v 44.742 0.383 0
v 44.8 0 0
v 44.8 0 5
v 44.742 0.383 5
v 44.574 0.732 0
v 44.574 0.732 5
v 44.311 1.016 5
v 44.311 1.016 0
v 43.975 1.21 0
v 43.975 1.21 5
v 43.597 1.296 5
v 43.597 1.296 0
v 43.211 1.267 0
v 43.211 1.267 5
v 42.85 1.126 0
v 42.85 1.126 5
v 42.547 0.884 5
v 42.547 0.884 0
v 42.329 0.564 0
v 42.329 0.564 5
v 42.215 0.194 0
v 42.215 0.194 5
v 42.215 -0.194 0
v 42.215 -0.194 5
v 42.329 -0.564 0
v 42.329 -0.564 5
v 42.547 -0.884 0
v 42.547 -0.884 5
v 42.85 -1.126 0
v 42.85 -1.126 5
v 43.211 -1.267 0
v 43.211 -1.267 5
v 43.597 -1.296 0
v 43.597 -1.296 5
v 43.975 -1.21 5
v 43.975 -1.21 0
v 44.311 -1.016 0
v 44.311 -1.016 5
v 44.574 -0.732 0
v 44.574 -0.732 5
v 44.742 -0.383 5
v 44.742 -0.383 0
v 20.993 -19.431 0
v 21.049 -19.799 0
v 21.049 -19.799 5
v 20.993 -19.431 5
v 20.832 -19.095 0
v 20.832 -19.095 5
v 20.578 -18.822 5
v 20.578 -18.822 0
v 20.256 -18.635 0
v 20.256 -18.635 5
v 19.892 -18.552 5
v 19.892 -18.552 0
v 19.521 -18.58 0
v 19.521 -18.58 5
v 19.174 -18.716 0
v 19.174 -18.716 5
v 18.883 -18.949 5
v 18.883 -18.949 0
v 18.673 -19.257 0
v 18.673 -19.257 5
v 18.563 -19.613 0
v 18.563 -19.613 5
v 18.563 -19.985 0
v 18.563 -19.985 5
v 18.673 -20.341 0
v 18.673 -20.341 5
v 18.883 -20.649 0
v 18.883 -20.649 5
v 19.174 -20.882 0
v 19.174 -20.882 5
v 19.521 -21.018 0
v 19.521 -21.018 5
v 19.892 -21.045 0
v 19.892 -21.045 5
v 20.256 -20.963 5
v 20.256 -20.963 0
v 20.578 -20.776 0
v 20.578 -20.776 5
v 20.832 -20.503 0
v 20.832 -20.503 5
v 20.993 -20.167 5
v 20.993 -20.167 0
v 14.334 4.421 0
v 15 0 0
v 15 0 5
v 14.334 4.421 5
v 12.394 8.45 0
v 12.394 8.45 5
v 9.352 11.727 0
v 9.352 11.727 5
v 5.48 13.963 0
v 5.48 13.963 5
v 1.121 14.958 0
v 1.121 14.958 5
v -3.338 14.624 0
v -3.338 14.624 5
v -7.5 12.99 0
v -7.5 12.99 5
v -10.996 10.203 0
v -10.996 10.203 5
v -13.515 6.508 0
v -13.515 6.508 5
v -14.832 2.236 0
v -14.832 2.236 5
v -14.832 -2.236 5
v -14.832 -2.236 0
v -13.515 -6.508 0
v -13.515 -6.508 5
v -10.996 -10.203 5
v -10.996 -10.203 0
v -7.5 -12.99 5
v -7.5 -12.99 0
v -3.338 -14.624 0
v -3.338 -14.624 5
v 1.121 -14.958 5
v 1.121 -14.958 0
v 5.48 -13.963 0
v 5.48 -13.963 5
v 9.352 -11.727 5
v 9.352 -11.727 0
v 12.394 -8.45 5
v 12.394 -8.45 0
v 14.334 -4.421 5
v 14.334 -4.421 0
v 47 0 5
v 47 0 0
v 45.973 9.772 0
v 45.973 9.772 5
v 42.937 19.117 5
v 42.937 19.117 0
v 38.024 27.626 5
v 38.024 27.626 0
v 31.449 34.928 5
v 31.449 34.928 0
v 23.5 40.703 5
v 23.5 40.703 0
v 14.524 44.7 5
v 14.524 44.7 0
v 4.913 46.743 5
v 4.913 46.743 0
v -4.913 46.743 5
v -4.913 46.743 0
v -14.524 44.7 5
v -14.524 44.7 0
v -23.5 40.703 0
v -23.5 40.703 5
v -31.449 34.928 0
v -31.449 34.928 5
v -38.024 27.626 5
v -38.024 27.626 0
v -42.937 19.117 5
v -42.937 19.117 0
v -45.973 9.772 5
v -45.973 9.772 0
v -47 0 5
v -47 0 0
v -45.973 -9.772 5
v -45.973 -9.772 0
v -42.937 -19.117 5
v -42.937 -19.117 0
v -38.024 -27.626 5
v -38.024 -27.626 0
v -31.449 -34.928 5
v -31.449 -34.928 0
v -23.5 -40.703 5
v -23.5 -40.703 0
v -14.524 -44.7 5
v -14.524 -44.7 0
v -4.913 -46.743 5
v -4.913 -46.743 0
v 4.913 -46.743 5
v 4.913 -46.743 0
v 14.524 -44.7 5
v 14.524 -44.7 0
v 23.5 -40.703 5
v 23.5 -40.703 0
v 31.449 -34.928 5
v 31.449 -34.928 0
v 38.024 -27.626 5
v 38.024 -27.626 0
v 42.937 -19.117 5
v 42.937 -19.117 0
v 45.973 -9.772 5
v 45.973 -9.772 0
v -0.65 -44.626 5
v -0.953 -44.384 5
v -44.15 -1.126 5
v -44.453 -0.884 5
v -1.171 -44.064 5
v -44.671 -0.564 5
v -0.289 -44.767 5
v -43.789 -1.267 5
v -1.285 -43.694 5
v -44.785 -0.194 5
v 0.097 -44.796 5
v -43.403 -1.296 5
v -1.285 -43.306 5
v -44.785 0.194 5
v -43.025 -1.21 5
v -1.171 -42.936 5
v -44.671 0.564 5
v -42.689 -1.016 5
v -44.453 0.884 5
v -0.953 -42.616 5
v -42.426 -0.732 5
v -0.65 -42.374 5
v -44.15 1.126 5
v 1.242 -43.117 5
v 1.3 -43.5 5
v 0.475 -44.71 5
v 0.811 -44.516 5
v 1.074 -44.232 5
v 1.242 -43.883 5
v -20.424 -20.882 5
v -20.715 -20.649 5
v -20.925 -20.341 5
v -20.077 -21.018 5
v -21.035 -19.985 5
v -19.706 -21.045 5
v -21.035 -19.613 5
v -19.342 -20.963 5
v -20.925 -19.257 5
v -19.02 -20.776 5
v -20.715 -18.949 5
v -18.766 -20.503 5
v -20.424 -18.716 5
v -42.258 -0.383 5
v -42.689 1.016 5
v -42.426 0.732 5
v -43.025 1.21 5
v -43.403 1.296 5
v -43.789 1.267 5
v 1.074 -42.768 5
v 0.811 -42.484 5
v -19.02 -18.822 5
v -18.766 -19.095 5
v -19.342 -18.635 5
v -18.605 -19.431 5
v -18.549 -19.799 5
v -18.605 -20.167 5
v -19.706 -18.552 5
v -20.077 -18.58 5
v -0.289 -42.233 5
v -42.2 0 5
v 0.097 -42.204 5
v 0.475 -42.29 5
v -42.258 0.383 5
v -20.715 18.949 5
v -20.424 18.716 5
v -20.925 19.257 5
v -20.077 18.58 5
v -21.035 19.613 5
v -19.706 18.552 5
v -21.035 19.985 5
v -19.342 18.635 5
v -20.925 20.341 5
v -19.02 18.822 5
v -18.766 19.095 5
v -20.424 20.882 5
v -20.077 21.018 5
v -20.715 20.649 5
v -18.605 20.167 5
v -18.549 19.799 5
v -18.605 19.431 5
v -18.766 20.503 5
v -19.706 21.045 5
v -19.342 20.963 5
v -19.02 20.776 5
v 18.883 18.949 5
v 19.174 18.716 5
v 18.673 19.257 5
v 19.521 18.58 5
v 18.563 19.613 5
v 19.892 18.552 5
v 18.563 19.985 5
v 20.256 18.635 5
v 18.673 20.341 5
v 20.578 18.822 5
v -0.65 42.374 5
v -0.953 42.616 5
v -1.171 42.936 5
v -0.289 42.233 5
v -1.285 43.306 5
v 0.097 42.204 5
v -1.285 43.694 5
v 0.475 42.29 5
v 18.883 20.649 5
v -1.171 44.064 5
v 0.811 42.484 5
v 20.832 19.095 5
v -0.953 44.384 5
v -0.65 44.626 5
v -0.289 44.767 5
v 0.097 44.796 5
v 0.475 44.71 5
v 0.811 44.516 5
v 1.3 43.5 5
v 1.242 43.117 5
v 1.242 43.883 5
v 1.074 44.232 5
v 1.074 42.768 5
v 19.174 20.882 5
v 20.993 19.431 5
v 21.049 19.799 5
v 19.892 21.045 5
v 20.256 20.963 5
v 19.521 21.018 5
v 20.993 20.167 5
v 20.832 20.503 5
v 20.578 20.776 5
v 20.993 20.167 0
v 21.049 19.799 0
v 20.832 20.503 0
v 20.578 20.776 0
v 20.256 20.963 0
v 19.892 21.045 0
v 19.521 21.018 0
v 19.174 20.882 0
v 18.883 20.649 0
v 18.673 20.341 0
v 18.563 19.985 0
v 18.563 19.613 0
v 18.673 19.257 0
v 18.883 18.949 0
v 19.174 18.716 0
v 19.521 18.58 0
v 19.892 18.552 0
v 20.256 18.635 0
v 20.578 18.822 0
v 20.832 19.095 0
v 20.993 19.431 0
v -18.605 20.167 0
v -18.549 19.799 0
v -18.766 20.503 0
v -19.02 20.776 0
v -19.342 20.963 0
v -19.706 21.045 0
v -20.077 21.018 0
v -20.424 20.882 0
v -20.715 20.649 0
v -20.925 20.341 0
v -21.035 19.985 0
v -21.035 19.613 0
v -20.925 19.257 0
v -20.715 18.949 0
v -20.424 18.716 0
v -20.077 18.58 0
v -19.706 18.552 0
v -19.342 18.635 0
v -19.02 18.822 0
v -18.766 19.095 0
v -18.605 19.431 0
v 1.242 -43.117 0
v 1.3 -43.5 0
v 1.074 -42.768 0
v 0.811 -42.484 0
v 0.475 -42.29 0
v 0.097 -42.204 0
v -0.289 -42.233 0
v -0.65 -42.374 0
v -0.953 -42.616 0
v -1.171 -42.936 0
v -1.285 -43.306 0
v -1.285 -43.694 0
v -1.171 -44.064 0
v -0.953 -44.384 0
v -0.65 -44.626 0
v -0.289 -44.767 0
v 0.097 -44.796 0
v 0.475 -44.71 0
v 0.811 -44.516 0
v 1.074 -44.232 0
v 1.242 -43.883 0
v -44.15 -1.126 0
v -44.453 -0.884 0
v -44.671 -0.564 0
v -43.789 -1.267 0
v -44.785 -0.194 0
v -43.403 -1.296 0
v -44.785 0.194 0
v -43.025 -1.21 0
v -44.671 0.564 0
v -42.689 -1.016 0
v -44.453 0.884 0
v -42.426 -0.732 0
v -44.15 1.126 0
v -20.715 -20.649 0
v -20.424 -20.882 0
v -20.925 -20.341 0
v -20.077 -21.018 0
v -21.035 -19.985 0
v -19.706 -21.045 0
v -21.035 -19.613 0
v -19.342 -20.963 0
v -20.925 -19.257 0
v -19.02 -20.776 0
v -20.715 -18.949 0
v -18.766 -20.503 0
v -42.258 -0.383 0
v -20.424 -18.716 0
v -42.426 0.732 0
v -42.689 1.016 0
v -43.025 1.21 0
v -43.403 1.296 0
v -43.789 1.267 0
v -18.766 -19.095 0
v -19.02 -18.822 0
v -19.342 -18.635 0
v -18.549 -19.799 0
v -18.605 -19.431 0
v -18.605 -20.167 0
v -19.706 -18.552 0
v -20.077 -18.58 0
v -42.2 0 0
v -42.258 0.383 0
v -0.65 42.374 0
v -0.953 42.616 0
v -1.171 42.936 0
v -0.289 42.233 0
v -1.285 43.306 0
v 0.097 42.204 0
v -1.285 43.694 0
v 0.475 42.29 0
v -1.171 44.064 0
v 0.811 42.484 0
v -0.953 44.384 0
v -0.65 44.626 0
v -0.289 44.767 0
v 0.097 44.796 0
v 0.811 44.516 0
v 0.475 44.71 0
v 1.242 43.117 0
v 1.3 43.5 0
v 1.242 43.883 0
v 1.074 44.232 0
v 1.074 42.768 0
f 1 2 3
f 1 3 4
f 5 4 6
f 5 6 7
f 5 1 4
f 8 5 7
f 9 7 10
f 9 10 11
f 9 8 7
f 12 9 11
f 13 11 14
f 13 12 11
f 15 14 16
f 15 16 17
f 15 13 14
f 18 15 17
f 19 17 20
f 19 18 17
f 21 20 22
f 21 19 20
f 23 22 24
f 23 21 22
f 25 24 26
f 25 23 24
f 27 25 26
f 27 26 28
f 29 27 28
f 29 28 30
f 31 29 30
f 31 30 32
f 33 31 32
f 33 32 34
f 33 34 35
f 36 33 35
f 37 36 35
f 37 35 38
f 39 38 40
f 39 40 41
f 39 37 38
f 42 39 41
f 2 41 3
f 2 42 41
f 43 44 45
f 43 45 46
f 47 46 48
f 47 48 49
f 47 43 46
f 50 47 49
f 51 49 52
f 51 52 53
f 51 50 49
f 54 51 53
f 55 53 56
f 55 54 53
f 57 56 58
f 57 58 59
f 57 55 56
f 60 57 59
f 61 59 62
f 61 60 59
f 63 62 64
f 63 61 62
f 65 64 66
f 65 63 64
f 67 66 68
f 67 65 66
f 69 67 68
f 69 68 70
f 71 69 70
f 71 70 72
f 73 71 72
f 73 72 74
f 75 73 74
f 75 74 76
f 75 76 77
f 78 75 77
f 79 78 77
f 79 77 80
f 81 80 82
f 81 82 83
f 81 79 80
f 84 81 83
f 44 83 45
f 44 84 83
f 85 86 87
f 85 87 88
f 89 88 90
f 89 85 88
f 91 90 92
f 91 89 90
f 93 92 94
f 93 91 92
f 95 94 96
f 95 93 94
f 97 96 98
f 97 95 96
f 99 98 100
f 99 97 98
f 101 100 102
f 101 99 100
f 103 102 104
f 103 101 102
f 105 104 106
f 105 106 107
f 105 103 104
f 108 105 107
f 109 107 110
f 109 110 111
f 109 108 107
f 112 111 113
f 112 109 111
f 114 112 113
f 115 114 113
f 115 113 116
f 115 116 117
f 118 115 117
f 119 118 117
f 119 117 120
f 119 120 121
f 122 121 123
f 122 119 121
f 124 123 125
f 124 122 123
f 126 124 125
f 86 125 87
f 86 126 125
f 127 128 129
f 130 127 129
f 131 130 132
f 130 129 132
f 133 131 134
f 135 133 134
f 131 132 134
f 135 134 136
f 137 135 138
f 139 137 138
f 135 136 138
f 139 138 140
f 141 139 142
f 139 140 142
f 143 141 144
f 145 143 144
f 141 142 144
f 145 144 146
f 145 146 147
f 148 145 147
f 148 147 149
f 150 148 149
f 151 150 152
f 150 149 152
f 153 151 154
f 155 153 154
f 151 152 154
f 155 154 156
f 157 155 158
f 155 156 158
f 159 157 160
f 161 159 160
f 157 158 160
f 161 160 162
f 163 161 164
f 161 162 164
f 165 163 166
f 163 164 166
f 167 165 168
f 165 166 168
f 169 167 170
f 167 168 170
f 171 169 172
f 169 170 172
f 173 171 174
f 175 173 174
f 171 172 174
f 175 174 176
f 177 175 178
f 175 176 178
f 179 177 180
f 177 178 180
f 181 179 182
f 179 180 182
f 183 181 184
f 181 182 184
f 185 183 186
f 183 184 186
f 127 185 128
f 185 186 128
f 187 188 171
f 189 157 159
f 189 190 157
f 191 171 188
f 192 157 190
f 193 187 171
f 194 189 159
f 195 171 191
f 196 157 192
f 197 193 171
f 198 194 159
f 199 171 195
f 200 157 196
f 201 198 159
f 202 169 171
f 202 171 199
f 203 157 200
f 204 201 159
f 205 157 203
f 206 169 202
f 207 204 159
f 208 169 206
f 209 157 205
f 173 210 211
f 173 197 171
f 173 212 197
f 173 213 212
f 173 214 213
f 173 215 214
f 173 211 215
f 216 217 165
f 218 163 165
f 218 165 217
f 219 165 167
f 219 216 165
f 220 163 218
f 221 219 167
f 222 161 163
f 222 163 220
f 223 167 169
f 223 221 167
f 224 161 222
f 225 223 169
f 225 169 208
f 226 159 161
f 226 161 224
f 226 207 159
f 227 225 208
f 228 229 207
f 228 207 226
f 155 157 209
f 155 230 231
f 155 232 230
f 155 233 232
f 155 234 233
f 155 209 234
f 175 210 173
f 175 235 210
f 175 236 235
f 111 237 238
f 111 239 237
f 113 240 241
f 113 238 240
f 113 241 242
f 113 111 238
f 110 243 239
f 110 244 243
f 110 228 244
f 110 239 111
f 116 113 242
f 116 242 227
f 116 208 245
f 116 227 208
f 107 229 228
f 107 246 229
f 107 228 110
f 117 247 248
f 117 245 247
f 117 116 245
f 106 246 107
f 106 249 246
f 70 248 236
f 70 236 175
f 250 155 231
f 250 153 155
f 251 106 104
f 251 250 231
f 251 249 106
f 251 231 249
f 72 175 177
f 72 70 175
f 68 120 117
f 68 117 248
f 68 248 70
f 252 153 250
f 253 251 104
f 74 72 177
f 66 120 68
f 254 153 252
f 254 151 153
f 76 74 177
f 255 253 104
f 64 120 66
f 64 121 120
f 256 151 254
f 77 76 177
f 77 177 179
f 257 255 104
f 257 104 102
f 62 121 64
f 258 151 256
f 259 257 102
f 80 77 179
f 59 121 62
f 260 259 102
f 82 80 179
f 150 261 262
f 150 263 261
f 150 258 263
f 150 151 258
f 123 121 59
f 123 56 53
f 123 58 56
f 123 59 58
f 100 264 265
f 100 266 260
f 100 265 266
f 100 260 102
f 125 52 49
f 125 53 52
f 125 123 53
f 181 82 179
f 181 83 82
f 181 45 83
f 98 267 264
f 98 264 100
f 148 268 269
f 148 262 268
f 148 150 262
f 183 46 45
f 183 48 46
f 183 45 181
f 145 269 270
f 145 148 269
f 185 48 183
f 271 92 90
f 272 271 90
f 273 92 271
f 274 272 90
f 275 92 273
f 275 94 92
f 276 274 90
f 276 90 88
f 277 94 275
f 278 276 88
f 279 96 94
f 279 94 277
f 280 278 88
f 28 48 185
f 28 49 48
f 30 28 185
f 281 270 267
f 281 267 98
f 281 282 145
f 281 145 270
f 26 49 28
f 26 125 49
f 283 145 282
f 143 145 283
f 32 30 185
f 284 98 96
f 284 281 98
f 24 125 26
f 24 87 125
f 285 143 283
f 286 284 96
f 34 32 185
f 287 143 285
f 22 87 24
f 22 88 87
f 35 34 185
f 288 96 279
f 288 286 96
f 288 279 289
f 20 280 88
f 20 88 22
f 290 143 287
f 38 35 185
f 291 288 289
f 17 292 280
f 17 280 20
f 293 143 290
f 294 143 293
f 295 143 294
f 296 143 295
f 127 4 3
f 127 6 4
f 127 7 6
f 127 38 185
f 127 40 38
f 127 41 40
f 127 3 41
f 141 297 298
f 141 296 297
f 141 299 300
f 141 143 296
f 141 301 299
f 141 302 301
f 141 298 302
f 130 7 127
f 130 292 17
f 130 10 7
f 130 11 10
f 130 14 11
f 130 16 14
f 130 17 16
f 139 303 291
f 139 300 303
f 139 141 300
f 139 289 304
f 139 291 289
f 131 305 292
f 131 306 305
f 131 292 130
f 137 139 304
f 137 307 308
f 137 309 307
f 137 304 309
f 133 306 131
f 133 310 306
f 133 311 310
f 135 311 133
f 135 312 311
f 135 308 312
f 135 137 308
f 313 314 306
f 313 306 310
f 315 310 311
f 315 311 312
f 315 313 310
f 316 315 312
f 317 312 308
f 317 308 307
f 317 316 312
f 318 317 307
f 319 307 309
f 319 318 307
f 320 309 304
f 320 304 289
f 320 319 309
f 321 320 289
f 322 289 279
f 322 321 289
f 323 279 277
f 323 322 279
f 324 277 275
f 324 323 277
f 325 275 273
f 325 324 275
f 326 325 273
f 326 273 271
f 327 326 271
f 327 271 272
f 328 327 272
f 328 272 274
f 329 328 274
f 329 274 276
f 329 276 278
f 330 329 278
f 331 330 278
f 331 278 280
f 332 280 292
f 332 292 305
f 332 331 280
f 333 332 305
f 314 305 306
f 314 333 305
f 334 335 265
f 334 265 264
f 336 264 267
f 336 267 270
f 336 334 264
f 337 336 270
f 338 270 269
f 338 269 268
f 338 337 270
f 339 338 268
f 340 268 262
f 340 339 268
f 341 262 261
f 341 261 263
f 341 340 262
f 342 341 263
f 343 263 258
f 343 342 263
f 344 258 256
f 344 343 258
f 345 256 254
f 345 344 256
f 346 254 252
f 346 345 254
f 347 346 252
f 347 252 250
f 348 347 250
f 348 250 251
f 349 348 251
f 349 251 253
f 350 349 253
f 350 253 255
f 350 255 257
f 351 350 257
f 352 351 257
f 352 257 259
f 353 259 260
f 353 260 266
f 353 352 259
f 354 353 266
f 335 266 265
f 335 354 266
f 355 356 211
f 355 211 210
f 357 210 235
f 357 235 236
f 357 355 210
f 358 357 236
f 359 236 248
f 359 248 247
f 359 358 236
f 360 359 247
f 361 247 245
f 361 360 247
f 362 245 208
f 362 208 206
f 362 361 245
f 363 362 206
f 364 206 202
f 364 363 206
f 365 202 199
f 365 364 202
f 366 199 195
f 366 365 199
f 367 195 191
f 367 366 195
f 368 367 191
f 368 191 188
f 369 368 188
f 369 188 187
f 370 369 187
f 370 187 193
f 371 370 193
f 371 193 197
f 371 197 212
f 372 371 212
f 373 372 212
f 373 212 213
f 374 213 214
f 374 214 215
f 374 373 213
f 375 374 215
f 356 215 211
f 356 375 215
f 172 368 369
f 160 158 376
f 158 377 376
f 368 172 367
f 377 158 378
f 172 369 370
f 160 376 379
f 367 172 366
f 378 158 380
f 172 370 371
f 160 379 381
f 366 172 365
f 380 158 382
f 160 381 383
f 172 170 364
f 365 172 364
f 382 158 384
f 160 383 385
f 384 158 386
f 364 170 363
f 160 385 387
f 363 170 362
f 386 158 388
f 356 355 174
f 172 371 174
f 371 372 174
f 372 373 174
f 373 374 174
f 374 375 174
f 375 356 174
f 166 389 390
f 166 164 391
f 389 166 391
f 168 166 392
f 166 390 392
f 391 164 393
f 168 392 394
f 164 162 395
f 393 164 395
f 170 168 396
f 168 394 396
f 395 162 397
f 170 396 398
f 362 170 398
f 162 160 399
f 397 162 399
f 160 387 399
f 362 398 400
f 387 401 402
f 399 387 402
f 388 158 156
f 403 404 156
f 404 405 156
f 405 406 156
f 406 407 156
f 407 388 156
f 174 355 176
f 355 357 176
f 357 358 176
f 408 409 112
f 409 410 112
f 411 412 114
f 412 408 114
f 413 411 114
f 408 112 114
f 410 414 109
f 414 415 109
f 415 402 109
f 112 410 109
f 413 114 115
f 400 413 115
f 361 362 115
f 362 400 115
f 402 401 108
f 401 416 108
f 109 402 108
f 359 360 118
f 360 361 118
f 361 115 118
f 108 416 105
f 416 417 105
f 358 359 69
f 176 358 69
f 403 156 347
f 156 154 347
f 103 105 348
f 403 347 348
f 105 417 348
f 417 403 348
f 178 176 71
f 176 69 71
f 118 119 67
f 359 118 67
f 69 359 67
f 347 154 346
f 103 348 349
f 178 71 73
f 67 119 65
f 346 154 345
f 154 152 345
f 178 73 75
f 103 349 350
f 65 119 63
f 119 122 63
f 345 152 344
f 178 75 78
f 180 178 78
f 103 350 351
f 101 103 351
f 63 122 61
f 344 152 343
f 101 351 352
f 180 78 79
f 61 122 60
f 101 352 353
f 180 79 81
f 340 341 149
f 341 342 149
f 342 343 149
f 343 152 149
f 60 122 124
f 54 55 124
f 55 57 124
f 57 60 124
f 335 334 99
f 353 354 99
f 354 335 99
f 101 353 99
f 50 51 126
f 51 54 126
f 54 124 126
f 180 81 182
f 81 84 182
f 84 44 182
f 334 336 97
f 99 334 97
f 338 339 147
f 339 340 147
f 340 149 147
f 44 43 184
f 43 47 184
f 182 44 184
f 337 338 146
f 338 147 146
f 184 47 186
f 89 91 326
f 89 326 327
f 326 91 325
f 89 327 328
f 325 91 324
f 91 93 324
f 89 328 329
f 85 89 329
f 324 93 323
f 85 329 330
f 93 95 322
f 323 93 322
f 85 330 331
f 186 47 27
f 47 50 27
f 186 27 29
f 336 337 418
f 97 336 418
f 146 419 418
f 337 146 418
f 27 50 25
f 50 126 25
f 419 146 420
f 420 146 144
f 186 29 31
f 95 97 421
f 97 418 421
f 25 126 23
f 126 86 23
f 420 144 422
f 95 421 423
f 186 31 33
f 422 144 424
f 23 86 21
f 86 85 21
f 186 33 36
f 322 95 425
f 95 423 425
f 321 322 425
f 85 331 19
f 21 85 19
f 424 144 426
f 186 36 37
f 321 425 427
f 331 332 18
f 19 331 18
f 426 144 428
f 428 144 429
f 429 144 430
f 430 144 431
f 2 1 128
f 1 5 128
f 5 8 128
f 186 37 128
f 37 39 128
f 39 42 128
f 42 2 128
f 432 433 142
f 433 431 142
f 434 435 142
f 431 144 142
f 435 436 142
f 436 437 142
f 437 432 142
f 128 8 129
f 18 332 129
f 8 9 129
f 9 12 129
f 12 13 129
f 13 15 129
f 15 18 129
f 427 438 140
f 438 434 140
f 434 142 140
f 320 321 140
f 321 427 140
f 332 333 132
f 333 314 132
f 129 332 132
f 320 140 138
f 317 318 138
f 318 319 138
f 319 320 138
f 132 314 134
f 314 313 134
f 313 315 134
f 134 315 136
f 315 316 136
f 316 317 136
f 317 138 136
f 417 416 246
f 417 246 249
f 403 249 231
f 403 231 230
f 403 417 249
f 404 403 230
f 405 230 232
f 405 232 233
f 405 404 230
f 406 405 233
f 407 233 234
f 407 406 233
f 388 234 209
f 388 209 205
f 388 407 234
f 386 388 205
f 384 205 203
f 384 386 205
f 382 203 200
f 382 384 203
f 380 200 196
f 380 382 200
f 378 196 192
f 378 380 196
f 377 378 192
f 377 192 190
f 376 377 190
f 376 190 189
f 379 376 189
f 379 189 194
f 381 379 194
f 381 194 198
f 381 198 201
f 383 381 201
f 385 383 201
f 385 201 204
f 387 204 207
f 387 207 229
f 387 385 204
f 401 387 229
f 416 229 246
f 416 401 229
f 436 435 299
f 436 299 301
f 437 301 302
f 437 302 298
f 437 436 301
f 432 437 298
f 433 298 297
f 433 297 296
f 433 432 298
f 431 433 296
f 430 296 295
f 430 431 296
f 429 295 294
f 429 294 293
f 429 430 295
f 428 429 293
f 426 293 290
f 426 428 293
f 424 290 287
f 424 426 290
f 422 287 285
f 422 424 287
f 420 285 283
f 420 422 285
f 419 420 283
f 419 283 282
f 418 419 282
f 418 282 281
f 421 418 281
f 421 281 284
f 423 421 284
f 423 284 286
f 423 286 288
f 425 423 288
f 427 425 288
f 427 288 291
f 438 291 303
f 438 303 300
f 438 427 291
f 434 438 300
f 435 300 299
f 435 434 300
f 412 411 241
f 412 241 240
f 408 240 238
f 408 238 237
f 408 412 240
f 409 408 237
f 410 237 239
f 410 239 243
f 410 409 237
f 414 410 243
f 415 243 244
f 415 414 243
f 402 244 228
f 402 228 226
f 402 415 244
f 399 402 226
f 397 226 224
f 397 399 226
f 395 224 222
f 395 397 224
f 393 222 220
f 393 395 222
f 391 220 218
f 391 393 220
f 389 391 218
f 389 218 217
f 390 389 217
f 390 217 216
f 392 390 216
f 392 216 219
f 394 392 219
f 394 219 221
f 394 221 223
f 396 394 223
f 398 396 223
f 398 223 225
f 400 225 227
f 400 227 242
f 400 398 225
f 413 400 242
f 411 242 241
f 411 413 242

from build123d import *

# Parameters (mm, degrees)
SKETCH1_R           = 47
SKETCH1_R_2         = 1.3
SKETCH1_R_3         = 15
SKETCH1_R_4         = 1.25
BOSS_EXTRUDE1_DEPTH = 5


with BuildPart() as part:
    # Sketch1 → Boss-Extrude1 (new body)
    with BuildSketch(Plane.XY):
        Circle(SKETCH1_R)
        with Locations((0, 43.5)):
            Circle(SKETCH1_R_2, mode=Mode.SUBTRACT)
        with Locations((43.5, 0)):
            Circle(SKETCH1_R_2, mode=Mode.SUBTRACT)
        with Locations((0, -43.5)):
            Circle(SKETCH1_R_2, mode=Mode.SUBTRACT)
        with Locations((-43.5, 0)):
            Circle(SKETCH1_R_2, mode=Mode.SUBTRACT)
        Circle(SKETCH1_R_3, mode=Mode.SUBTRACT)
        with Locations((-19.798989873, 19.798989873)):
            Circle(SKETCH1_R_4, mode=Mode.SUBTRACT)
        with Locations((19.798989873, 19.798989873)):
            Circle(SKETCH1_R_4, mode=Mode.SUBTRACT)
        with Locations((19.798989873, -19.798989873)):
            Circle(SKETCH1_R_4, mode=Mode.SUBTRACT)
        with Locations((-19.798989873, -19.798989873)):
            Circle(SKETCH1_R_4, mode=Mode.SUBTRACT)
    extrude(amount=BOSS_EXTRUDE1_DEPTH)


solid = part.part
